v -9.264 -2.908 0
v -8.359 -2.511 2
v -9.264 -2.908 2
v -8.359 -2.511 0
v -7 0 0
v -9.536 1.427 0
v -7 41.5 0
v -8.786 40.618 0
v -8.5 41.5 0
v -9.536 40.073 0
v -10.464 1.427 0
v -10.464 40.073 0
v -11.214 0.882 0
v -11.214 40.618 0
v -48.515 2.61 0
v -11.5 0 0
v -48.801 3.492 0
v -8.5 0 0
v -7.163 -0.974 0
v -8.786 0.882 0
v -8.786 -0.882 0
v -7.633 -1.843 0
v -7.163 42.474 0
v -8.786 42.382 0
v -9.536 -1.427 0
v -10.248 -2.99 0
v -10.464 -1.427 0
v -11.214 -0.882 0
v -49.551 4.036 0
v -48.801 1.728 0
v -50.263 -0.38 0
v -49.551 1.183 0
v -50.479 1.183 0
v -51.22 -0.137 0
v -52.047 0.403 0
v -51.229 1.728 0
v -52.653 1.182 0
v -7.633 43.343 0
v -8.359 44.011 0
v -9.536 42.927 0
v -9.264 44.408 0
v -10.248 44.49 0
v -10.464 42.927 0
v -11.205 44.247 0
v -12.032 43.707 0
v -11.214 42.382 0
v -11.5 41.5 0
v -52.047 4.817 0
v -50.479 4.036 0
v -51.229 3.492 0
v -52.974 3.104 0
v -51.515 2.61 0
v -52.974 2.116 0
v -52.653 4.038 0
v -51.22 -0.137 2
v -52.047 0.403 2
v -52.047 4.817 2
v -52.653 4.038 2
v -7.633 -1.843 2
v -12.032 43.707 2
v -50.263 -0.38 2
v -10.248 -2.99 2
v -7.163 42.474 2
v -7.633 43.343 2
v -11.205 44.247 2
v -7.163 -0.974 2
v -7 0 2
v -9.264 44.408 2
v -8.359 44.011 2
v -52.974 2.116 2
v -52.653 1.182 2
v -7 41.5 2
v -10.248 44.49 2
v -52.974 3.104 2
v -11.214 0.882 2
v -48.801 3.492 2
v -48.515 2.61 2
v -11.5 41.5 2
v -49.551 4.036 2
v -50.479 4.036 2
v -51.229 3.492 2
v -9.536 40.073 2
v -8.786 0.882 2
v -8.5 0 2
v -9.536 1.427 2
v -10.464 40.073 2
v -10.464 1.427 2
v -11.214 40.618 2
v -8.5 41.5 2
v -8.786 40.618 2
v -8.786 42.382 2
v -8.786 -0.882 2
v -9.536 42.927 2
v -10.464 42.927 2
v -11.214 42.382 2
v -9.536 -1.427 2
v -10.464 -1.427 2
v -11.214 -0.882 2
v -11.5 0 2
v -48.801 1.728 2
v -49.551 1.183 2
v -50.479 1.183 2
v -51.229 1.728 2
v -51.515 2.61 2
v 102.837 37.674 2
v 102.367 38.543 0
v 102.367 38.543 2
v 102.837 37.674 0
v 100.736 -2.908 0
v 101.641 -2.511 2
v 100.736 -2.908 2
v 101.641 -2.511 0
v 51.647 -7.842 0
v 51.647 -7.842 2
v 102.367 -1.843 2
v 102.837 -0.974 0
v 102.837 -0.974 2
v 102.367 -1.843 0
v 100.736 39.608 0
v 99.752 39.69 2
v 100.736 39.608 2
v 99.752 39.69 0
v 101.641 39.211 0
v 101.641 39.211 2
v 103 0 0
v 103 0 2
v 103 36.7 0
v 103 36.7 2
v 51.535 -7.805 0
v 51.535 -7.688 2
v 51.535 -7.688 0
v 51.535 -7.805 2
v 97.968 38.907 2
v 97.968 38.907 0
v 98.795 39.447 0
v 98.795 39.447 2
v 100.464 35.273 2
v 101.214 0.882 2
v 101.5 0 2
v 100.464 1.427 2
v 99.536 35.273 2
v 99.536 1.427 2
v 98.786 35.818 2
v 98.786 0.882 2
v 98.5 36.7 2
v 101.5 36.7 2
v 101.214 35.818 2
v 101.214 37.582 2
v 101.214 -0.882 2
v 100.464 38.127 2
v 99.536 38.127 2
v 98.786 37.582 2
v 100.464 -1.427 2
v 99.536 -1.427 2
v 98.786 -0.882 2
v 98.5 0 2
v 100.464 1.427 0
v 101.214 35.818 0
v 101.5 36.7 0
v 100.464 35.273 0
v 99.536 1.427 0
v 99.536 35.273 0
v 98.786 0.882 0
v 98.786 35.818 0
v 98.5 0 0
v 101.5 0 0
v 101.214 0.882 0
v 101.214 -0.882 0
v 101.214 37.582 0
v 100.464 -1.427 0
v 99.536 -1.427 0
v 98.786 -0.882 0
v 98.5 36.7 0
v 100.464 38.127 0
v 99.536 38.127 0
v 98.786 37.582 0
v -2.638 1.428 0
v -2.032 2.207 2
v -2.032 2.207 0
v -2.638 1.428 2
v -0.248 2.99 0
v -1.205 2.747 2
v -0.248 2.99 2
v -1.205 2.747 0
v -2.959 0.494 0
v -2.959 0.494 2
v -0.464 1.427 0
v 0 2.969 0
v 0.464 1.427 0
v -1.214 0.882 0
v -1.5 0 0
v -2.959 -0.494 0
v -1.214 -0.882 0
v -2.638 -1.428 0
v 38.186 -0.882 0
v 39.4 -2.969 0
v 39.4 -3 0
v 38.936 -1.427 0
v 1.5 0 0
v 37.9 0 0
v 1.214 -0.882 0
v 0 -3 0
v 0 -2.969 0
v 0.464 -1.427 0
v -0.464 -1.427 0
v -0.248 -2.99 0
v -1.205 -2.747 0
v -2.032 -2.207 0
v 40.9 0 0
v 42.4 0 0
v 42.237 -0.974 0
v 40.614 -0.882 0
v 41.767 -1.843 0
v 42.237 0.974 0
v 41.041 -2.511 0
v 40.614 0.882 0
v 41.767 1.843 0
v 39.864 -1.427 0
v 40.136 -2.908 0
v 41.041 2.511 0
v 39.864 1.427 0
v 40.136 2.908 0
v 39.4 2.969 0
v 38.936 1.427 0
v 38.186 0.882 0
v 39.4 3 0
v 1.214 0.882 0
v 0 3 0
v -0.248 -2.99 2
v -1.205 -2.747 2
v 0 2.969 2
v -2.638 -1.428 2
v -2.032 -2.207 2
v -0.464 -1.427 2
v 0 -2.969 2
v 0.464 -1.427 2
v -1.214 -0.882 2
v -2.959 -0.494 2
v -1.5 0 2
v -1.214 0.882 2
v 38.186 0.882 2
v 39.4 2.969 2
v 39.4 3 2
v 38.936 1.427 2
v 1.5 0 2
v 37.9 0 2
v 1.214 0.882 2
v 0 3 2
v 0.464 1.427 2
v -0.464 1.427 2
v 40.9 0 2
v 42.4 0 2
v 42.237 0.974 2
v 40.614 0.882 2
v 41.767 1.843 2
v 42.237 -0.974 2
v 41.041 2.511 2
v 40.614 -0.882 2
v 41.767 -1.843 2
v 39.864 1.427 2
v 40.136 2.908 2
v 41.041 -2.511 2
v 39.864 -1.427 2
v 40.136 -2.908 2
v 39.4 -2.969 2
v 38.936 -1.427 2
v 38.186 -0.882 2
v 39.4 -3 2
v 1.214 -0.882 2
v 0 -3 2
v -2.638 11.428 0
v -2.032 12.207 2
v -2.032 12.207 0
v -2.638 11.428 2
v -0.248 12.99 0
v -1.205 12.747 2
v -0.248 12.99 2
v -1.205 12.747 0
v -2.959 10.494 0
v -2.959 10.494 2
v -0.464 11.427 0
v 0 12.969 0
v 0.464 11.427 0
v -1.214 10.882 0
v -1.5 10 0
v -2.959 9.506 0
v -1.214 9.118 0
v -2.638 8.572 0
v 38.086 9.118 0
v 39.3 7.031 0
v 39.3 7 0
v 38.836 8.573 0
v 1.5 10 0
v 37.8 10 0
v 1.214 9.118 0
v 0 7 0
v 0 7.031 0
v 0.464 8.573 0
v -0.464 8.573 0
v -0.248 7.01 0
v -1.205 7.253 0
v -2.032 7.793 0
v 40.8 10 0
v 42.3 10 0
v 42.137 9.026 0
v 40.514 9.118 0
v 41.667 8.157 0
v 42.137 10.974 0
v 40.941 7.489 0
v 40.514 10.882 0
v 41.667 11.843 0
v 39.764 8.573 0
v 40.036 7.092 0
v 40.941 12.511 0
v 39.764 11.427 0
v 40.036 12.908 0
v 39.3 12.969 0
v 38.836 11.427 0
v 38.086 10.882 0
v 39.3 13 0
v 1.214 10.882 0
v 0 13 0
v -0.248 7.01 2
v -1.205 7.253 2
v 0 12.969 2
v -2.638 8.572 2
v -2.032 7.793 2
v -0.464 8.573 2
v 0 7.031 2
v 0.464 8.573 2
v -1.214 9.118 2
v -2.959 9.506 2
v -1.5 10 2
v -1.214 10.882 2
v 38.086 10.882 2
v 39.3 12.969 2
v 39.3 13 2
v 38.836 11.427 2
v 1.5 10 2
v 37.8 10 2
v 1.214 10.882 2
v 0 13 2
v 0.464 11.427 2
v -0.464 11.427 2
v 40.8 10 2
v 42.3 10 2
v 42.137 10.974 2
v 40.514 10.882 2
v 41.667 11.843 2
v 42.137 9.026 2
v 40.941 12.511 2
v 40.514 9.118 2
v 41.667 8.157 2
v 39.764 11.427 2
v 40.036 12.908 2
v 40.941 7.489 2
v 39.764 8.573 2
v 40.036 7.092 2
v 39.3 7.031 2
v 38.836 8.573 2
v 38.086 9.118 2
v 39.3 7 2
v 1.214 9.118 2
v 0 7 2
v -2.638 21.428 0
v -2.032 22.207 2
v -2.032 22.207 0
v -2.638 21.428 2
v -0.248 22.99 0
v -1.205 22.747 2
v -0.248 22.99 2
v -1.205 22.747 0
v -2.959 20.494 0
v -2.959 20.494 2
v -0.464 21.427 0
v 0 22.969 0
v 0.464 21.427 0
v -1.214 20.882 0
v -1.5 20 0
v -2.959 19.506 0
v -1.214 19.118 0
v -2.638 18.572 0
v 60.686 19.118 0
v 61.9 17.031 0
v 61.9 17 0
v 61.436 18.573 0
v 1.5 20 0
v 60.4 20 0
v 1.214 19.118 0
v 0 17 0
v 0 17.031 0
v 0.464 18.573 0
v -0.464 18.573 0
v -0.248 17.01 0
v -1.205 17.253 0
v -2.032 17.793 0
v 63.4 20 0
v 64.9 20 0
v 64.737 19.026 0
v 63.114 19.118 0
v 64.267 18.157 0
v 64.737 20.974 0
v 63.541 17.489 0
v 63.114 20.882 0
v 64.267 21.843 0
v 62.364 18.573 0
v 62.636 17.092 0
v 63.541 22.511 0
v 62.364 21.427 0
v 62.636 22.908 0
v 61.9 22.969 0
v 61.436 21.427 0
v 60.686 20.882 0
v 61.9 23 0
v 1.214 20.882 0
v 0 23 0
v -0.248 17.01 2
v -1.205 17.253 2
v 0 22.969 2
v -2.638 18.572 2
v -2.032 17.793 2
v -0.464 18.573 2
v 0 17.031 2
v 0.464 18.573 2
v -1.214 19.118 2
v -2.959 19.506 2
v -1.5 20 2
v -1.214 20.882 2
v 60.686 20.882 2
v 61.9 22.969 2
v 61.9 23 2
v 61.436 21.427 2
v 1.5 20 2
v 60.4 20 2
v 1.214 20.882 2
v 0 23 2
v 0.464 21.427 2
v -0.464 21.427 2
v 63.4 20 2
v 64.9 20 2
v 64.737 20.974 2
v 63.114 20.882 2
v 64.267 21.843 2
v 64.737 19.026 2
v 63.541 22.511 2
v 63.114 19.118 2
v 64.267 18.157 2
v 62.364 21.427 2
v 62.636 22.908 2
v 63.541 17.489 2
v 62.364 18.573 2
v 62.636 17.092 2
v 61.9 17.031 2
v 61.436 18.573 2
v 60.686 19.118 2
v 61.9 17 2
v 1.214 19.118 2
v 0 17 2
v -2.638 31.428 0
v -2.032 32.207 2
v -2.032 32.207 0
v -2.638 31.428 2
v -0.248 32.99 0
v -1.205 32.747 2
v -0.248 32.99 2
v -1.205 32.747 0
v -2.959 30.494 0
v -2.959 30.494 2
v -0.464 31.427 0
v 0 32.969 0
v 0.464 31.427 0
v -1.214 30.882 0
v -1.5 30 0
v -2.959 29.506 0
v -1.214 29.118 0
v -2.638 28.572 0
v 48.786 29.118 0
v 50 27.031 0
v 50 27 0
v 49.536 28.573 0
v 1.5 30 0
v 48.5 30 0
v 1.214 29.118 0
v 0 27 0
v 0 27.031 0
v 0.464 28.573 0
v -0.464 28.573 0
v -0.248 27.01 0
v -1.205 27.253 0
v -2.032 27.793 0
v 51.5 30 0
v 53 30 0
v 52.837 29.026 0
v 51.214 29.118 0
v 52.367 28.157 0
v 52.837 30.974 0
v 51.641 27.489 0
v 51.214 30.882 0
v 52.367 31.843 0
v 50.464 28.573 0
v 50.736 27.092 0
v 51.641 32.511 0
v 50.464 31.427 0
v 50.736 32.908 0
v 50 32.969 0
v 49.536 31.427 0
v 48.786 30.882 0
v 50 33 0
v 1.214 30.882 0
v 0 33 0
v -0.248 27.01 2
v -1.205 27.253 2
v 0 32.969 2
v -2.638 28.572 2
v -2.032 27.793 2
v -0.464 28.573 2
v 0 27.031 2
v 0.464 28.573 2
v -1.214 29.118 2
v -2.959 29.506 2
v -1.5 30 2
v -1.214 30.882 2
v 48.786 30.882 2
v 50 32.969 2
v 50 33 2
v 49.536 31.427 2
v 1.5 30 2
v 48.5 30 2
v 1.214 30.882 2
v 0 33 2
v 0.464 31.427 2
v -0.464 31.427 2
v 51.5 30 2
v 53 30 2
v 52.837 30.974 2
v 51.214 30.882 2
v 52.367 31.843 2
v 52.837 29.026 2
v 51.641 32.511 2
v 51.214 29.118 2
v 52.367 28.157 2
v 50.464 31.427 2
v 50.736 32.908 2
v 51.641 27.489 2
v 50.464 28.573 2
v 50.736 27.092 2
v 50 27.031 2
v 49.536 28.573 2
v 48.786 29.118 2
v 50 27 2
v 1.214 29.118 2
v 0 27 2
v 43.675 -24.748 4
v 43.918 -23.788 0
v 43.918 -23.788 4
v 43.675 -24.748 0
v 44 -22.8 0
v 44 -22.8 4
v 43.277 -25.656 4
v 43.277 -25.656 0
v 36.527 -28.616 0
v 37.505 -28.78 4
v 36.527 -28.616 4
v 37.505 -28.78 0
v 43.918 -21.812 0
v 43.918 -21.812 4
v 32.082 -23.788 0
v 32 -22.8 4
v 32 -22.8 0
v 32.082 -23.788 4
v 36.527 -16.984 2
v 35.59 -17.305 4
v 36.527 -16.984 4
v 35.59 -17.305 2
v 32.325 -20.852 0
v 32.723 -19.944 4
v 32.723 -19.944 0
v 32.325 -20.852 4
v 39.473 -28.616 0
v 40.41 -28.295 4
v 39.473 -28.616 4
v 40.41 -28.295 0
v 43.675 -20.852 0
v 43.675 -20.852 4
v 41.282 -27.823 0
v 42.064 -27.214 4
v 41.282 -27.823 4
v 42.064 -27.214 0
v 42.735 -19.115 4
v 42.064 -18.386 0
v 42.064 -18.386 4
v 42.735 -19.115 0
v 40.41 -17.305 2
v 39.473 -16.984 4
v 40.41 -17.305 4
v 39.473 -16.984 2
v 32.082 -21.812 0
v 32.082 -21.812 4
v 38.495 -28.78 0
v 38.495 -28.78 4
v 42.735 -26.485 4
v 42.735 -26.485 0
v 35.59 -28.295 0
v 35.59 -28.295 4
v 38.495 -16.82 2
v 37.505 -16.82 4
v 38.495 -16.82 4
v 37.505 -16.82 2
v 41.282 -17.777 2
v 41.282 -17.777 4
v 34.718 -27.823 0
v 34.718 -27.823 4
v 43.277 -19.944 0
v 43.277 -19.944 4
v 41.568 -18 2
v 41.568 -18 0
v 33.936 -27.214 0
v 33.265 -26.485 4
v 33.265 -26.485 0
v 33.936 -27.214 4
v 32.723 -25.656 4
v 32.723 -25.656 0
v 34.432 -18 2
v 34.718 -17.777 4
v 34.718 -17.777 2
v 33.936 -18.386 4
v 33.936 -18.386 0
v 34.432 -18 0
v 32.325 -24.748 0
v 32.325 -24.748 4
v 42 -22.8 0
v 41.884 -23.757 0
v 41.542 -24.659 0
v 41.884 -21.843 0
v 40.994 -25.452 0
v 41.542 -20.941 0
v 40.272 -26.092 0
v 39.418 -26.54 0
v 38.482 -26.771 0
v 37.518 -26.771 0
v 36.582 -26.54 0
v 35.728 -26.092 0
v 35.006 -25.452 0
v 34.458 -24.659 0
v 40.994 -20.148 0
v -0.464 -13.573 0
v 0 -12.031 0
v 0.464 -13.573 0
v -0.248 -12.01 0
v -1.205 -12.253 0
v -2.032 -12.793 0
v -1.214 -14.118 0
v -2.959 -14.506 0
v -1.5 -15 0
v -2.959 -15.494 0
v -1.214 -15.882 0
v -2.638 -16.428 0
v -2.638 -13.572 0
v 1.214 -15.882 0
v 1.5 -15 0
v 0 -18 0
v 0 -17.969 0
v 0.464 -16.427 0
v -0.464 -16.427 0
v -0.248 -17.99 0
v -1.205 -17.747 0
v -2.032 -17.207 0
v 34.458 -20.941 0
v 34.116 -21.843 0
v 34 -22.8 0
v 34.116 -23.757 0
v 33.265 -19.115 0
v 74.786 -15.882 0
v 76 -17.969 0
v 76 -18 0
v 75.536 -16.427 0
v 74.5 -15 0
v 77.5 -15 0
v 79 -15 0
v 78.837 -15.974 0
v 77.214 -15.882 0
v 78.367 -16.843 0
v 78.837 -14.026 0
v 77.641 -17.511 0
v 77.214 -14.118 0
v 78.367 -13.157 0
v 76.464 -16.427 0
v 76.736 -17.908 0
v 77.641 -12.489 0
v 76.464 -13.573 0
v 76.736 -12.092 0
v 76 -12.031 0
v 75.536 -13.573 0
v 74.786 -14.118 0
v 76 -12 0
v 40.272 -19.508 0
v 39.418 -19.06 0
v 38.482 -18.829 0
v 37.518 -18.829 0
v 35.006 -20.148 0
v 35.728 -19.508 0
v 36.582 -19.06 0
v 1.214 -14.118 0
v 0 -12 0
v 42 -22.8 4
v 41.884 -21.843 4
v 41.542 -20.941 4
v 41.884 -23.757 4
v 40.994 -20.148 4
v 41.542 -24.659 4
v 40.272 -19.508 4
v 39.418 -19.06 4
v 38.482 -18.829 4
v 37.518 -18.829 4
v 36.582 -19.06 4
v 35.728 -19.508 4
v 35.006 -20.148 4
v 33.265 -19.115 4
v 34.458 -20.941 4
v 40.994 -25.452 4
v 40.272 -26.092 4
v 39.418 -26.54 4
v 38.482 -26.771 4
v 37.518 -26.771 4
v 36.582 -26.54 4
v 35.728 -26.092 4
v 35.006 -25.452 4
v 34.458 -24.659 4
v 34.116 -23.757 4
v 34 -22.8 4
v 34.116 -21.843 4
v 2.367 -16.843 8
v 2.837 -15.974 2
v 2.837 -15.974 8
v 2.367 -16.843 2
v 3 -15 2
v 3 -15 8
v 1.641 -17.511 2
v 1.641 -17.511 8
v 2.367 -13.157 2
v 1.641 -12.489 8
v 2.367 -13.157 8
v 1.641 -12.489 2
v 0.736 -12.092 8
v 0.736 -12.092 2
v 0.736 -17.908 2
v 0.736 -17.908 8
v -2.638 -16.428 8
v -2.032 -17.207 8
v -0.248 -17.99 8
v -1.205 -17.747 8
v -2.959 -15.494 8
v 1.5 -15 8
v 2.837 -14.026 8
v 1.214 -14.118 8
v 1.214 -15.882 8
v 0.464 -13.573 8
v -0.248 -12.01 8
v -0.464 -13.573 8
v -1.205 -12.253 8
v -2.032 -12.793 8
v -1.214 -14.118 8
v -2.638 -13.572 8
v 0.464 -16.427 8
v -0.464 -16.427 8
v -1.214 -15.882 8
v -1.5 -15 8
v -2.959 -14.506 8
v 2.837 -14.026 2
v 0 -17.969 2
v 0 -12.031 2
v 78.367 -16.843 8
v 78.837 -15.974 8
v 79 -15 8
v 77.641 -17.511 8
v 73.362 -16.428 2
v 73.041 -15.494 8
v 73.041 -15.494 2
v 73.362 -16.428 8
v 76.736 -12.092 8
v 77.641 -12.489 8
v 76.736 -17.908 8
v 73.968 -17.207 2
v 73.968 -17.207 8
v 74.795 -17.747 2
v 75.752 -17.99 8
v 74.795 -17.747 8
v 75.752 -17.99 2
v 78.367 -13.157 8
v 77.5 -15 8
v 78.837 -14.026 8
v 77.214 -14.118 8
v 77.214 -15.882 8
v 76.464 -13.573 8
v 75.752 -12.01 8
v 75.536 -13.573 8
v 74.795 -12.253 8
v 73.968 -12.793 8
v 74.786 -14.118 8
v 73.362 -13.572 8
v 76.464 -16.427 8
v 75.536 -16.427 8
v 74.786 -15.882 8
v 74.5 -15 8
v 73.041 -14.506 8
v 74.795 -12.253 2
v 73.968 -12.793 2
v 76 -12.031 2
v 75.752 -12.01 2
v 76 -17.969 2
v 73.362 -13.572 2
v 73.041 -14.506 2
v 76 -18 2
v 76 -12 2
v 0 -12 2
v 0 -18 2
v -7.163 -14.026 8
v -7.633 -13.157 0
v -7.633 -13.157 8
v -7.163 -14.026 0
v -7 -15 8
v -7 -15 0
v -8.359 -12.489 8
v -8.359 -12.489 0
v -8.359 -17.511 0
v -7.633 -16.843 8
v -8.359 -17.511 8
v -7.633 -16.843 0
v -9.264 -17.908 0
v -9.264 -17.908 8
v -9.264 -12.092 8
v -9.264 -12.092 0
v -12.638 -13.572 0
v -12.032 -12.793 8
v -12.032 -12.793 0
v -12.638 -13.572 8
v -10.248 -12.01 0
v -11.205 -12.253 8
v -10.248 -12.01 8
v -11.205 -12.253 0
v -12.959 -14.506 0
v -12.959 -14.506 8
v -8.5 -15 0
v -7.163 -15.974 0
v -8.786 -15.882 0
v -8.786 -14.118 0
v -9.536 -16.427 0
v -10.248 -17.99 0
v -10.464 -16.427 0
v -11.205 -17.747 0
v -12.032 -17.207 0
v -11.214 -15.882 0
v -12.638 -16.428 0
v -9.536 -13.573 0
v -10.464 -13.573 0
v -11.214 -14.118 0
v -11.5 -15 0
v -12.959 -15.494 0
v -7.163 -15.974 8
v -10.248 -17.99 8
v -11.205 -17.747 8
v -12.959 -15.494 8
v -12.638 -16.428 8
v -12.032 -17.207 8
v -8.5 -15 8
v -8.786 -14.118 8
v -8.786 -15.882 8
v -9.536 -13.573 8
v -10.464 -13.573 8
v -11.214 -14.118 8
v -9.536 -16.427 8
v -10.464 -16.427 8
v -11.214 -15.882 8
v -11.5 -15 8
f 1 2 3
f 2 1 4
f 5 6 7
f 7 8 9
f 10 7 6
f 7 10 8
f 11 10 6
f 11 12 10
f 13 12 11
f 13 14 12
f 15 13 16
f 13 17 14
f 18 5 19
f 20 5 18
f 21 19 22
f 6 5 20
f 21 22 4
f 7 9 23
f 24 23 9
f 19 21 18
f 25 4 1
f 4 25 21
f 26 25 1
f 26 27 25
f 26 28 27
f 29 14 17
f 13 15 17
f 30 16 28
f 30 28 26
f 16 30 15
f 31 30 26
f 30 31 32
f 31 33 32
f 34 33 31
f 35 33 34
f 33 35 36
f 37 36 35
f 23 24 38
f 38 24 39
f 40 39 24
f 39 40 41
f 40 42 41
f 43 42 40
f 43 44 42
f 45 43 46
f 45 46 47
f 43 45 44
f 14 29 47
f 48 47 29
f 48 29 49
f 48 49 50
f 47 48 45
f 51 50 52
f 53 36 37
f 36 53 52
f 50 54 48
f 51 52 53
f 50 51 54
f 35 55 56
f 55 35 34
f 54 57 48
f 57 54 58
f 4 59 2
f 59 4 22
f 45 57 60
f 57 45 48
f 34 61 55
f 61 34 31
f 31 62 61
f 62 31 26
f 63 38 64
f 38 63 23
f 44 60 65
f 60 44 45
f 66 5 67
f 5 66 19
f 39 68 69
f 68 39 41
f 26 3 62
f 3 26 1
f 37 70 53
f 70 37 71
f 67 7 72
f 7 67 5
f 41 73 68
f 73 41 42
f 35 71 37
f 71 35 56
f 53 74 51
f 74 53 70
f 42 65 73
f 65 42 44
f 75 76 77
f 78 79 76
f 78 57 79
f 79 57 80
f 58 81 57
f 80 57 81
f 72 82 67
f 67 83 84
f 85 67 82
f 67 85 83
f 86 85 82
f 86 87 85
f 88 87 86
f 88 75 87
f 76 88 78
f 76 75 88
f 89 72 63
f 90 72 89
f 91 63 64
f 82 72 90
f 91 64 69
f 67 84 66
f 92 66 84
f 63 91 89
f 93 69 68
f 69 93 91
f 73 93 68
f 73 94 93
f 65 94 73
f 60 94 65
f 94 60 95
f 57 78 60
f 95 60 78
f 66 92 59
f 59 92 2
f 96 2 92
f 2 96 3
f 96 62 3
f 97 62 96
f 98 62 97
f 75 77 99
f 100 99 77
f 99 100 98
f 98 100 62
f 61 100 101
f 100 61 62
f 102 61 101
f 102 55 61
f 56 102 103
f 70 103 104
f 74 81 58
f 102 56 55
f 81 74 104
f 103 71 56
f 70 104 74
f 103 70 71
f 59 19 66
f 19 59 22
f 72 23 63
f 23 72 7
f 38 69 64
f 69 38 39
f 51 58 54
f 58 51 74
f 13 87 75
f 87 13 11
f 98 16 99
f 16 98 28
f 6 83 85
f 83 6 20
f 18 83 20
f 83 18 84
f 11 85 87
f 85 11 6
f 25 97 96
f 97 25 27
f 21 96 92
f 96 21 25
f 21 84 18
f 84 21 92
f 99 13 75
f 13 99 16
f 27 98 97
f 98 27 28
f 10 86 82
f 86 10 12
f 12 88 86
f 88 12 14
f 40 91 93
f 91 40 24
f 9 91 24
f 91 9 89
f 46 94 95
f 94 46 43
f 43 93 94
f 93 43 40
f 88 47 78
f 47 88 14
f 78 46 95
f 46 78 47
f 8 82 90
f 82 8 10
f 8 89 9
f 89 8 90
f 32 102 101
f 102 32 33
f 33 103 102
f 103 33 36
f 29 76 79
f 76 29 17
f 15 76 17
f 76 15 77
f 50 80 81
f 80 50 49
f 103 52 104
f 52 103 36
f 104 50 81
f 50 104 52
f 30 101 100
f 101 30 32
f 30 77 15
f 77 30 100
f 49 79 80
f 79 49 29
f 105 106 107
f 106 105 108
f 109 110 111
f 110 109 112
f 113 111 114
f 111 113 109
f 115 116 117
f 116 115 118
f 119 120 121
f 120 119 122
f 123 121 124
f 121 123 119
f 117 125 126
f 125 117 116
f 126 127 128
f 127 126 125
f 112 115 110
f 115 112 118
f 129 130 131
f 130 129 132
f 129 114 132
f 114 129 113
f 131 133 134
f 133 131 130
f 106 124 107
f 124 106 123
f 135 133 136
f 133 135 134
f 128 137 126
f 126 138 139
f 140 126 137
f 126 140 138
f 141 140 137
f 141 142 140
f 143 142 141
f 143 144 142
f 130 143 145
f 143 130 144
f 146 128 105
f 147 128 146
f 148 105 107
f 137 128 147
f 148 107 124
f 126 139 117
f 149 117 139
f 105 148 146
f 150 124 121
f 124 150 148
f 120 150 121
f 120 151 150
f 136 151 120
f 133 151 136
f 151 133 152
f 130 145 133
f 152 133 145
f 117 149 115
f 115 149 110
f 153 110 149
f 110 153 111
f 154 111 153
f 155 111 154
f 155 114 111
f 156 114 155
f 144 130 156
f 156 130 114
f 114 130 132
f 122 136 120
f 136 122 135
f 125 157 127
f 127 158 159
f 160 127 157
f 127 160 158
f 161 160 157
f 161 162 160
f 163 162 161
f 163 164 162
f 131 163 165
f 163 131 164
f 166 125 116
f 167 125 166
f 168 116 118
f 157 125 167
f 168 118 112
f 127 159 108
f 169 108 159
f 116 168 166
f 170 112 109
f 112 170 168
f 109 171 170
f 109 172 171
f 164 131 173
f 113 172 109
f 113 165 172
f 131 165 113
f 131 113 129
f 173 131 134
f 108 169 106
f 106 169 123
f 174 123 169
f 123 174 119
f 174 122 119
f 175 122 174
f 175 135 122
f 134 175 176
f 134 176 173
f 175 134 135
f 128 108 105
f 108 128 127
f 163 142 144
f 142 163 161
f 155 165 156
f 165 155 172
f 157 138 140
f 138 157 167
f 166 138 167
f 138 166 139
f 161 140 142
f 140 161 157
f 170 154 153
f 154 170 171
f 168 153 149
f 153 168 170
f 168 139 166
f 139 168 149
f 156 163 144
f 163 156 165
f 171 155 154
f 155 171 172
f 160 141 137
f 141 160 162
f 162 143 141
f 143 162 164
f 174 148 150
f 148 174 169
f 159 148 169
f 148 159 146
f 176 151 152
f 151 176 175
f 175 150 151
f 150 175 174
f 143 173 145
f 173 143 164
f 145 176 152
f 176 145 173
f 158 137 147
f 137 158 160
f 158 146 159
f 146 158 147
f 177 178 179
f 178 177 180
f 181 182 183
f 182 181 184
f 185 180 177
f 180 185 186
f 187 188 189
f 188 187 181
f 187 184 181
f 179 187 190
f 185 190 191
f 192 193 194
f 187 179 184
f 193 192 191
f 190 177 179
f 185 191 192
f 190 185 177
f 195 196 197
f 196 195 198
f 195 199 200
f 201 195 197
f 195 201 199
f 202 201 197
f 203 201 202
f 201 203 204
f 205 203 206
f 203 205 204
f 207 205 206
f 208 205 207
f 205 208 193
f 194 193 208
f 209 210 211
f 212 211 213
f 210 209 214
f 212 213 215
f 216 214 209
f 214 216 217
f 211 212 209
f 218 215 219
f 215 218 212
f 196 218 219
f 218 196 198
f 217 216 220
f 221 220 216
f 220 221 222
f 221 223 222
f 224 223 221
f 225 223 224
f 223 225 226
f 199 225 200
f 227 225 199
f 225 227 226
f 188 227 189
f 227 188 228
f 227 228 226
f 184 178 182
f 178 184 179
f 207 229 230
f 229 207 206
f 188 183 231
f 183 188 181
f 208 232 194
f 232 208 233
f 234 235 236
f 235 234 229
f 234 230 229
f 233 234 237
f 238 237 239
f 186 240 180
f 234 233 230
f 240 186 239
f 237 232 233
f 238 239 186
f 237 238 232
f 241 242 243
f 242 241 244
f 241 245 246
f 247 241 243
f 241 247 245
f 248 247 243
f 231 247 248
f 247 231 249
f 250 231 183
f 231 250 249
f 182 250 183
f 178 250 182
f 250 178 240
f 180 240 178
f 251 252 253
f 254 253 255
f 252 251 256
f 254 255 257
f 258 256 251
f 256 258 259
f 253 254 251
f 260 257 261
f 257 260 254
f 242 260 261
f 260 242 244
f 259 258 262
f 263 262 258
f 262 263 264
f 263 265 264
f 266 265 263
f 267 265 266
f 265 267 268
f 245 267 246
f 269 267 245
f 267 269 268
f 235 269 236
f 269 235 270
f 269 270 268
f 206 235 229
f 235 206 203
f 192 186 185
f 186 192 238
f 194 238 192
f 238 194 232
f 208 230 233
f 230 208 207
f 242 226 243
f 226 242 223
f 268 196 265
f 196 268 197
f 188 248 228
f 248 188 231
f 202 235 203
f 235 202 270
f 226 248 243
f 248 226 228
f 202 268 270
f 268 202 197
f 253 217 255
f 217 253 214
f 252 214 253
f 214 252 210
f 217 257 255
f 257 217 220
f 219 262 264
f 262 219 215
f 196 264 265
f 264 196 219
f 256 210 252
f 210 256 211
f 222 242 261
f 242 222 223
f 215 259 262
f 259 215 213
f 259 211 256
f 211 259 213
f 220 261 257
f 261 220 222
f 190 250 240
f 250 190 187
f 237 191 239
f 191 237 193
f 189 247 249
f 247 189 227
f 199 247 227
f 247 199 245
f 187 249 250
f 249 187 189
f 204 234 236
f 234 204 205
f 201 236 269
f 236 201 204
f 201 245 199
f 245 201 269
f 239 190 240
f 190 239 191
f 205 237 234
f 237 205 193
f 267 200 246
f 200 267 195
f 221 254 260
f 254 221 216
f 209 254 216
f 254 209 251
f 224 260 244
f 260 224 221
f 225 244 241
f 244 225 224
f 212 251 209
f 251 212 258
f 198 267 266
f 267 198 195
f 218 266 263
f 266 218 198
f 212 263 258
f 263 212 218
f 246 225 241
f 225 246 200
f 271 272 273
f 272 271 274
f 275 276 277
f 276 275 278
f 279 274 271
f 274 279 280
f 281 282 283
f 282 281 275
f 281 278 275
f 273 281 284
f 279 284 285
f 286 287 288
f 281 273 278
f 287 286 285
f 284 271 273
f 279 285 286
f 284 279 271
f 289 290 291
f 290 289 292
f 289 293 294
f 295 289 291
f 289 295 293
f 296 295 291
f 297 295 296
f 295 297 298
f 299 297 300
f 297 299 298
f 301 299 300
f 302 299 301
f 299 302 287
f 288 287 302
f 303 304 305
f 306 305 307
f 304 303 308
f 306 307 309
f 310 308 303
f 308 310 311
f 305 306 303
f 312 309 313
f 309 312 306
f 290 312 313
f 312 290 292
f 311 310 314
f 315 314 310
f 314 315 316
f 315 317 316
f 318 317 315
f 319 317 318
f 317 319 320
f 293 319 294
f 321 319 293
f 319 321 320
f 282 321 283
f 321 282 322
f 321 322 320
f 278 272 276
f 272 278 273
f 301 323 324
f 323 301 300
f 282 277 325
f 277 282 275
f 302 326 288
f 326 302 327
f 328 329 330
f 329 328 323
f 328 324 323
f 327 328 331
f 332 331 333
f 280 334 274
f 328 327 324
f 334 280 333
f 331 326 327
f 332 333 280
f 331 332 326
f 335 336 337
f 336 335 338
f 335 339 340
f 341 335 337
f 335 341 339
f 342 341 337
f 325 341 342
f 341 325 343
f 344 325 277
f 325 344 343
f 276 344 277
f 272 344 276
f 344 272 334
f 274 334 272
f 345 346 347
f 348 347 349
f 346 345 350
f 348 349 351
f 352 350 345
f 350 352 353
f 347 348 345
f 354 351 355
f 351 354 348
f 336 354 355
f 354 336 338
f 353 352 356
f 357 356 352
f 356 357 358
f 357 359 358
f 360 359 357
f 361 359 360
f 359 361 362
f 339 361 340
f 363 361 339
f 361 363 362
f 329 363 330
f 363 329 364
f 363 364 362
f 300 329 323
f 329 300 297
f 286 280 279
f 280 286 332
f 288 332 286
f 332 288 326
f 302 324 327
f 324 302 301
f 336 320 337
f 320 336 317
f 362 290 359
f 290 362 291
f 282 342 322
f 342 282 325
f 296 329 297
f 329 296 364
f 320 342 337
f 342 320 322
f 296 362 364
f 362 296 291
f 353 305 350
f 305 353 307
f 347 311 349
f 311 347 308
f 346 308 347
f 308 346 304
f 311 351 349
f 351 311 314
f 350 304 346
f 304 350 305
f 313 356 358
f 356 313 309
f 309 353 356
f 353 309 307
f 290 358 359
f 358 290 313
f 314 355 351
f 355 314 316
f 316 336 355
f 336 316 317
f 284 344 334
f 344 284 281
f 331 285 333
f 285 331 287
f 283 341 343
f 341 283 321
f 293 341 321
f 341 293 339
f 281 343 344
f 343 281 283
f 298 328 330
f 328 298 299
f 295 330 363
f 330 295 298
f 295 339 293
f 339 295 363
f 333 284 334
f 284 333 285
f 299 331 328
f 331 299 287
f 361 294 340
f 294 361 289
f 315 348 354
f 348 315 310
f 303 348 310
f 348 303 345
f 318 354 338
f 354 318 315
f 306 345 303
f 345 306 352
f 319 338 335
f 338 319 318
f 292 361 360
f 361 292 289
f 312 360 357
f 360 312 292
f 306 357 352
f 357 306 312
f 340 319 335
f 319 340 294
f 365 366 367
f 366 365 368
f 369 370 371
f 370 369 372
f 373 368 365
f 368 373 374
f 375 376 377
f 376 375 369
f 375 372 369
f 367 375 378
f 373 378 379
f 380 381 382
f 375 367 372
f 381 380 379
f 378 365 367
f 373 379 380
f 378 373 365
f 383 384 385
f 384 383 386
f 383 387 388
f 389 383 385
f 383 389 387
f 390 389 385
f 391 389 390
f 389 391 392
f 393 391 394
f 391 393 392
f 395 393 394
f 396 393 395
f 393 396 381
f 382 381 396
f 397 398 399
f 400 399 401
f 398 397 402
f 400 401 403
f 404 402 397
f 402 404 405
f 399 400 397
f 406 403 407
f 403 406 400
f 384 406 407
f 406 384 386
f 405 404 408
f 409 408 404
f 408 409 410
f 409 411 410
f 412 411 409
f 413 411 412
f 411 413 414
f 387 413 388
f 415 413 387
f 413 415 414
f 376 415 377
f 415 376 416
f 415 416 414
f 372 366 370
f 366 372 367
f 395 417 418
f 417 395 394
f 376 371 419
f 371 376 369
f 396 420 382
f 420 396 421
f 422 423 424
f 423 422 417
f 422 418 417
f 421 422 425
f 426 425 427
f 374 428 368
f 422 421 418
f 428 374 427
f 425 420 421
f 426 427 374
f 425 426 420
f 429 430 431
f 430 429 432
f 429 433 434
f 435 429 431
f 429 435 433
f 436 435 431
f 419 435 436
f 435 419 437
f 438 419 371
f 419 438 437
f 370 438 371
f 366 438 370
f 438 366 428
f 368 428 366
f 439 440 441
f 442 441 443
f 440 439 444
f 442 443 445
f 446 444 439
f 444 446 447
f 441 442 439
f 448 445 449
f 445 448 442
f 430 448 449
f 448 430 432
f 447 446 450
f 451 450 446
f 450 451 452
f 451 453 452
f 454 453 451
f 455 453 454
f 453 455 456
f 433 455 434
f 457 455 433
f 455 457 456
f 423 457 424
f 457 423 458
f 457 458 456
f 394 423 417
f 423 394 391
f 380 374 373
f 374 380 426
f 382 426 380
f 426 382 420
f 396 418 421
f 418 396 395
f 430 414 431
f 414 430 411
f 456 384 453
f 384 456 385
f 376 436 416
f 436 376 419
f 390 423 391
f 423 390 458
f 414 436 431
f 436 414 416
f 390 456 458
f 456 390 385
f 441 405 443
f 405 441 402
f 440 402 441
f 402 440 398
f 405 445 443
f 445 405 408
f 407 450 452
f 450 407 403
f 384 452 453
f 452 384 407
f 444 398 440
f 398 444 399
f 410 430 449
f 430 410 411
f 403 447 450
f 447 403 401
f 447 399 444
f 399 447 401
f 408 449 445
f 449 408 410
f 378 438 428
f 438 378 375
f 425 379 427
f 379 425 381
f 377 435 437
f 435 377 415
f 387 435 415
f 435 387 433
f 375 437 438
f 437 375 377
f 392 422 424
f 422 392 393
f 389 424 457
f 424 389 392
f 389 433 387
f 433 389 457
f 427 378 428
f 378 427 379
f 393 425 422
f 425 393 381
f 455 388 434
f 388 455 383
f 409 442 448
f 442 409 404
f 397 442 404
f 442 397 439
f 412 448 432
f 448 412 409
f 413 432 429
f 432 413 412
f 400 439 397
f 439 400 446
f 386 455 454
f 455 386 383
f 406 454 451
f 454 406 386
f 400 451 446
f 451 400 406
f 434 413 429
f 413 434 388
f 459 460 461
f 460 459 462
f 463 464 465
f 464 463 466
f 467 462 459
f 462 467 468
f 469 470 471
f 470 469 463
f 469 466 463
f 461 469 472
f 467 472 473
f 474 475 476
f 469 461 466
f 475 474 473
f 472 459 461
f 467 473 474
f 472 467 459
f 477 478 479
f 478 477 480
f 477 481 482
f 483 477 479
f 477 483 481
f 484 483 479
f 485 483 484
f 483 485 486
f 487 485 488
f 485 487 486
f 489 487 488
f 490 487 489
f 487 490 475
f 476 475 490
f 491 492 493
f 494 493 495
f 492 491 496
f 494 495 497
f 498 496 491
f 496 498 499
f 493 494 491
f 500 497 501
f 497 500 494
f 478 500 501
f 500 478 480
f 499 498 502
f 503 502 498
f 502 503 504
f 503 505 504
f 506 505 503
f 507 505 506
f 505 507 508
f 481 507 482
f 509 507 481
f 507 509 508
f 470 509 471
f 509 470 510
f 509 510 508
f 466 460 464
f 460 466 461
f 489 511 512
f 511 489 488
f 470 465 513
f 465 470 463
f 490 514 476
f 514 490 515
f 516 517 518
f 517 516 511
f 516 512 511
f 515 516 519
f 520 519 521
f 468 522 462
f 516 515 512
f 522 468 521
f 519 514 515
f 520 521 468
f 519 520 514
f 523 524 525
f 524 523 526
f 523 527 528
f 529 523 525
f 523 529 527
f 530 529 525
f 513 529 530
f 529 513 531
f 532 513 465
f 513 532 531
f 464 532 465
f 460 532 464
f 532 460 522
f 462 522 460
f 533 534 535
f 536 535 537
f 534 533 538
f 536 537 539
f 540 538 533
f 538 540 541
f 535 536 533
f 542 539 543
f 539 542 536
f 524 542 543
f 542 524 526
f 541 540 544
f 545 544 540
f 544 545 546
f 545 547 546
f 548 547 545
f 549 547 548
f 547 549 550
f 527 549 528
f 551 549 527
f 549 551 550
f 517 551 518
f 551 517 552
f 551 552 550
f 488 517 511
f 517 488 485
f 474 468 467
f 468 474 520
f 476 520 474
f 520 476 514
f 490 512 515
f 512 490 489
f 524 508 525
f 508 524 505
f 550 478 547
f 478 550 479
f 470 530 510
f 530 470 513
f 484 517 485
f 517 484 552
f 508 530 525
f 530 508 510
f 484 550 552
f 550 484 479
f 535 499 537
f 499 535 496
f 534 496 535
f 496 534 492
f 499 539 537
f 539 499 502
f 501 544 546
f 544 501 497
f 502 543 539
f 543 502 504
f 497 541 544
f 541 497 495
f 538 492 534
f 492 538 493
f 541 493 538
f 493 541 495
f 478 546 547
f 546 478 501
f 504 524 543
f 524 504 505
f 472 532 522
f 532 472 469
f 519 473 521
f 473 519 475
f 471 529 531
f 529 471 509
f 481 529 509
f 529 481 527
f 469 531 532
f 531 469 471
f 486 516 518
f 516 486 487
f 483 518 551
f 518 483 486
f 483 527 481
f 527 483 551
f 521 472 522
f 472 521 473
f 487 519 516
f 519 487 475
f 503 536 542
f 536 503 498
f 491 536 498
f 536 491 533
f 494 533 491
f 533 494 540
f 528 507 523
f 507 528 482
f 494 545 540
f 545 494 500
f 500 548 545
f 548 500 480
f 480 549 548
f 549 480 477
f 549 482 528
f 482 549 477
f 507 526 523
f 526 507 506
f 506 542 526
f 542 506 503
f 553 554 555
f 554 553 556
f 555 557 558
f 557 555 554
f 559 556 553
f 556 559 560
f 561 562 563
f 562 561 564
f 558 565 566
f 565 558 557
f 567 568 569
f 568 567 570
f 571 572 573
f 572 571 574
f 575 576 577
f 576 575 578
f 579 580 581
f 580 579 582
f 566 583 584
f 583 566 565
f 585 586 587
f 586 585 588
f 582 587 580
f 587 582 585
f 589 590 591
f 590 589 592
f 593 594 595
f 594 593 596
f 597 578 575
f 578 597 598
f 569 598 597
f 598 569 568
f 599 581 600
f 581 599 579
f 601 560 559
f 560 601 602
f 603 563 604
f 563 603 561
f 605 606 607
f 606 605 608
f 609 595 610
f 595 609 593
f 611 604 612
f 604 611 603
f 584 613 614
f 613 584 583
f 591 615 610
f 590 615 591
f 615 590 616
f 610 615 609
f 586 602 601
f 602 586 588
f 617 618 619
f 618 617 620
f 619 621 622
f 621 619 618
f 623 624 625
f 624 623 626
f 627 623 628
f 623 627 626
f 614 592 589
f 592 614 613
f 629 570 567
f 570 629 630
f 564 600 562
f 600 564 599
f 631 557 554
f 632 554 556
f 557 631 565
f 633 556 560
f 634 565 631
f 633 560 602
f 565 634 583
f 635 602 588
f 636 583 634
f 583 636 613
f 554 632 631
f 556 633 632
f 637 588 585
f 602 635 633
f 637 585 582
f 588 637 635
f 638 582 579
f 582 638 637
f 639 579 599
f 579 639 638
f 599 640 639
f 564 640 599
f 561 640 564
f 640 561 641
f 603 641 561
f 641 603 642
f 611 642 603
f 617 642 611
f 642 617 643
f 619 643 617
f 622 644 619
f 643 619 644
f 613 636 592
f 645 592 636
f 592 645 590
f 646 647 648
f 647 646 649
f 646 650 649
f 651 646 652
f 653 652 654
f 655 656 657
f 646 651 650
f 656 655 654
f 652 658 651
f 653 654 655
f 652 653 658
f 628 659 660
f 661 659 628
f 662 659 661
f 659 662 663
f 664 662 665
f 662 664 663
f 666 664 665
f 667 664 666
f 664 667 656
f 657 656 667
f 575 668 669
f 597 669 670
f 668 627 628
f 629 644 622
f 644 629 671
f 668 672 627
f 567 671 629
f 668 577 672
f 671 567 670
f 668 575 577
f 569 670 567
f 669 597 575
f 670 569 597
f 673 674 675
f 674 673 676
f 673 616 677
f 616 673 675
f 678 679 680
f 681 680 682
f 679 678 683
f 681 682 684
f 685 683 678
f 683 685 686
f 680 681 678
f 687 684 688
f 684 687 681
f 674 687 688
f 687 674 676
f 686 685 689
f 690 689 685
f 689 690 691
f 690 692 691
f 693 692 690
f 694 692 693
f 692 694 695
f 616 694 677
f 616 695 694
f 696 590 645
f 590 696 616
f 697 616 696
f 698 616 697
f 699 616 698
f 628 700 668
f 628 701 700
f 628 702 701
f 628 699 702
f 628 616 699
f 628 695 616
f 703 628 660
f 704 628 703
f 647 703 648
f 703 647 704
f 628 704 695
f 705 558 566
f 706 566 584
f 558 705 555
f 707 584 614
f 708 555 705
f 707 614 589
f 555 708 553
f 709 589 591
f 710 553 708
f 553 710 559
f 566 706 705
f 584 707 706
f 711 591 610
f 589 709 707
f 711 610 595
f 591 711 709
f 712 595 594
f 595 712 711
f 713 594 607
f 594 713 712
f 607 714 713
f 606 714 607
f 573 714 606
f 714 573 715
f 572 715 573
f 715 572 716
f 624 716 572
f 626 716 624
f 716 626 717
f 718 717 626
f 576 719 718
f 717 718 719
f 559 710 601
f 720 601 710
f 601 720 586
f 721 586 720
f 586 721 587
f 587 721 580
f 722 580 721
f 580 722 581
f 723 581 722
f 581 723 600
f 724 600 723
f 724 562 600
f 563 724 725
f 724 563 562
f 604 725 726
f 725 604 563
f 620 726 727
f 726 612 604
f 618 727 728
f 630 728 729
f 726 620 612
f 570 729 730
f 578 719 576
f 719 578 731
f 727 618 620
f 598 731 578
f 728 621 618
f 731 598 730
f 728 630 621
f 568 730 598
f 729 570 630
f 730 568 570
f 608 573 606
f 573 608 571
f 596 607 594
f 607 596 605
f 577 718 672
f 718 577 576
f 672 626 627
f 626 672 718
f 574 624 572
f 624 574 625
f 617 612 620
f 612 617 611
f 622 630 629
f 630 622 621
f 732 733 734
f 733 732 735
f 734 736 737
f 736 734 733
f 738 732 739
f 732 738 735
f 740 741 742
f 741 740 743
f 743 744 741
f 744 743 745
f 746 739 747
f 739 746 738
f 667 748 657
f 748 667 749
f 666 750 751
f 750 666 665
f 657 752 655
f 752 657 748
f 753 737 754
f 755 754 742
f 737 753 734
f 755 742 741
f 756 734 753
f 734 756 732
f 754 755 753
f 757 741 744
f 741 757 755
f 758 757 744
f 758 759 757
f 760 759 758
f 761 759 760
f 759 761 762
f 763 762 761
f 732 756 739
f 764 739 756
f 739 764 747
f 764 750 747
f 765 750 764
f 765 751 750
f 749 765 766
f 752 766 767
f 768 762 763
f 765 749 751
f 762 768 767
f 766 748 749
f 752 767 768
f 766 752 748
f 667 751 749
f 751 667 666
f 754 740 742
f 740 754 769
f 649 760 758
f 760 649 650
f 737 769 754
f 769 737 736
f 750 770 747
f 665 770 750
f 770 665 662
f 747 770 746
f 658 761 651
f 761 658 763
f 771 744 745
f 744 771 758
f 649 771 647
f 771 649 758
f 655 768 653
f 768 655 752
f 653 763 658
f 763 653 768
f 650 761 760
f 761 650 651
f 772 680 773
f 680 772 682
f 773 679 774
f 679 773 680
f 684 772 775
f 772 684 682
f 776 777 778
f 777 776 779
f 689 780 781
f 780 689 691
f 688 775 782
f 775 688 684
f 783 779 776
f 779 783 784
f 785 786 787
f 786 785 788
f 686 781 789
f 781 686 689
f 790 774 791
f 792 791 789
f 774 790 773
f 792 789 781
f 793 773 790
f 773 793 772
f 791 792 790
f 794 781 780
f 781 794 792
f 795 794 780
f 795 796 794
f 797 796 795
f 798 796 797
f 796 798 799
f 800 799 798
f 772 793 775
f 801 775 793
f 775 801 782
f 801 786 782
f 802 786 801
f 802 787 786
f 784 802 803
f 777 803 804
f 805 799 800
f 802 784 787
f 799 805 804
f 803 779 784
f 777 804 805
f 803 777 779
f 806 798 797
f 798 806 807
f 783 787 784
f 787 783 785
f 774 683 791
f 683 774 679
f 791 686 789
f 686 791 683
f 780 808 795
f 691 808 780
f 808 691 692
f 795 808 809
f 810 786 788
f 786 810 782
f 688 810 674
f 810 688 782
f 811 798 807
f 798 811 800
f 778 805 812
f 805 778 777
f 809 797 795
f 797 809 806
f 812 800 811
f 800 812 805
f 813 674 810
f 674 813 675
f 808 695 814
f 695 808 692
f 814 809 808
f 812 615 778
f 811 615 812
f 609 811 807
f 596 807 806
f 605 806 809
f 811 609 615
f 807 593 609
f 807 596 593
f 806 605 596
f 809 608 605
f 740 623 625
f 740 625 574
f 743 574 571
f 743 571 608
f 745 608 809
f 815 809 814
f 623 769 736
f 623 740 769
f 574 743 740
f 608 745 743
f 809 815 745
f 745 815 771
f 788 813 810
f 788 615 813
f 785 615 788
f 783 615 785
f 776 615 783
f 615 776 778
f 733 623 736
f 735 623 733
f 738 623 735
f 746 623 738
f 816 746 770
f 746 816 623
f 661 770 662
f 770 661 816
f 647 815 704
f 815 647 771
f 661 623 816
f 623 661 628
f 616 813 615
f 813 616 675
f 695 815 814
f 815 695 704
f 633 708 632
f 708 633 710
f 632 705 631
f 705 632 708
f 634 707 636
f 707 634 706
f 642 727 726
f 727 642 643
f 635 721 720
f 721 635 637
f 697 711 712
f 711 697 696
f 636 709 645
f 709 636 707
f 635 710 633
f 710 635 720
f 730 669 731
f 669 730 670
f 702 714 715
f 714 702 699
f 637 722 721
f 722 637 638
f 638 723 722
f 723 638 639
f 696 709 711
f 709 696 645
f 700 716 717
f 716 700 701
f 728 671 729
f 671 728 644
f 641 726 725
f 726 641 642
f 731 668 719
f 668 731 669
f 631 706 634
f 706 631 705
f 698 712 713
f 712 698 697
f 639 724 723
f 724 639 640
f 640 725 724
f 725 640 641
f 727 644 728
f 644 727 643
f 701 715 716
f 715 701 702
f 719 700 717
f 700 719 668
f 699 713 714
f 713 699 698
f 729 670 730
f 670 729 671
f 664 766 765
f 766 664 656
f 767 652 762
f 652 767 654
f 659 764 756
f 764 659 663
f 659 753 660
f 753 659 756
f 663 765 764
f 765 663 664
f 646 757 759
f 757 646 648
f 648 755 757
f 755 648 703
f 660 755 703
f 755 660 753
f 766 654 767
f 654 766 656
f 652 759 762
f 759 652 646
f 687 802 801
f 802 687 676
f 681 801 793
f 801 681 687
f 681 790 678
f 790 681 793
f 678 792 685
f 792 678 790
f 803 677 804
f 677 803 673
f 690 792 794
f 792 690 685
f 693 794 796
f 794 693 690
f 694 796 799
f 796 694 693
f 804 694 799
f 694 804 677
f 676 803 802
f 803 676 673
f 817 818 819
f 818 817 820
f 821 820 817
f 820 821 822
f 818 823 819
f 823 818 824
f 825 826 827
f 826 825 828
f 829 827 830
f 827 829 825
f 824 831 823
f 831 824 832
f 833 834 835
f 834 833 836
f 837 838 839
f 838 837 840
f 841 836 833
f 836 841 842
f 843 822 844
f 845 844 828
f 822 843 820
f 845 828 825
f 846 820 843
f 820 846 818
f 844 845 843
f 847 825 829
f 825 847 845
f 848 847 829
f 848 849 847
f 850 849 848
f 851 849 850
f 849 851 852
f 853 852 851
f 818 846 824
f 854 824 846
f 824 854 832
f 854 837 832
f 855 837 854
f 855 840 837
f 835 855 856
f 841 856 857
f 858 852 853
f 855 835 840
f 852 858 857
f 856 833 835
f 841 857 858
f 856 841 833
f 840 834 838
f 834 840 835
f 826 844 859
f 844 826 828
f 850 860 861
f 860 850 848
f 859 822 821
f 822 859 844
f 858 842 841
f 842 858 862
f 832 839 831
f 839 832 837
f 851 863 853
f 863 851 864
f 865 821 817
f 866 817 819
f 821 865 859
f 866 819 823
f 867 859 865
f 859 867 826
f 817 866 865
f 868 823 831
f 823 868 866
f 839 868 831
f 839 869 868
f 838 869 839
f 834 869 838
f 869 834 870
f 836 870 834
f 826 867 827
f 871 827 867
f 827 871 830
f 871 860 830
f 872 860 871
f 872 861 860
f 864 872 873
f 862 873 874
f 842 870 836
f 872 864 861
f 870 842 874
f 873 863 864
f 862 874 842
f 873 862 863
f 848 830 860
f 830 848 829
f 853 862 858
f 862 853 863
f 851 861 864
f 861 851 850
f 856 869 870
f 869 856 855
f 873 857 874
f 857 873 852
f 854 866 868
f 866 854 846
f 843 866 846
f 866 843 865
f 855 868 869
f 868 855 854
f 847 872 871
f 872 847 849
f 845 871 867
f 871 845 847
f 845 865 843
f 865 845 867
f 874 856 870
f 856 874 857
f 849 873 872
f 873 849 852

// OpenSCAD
/*
 * A desendent of Theo Jansen's Strandbeests
 *
 * Copyright 2013 Barnaby Shearer <b@Zi.iS>
 * License CC BY 3.0
 */
$fa = 1;
$fs = 1;
preview = 0;

beast();

module beast(
	scale = .1
) {
	a = 380*scale;
	l=78*scale;

	if(preview==1) {
	
		for(x=[0:3]) {
			translate([
				0,
				0,
				x*28
			]) {
				leg(phase=x%2 * 180) {
					rotate([
						0,
						180,
						0
					]) {
						leg(phase=x%2 * 180, dir=-1);
					}
				}
				if(x<3) {
					translate([
						a,
						l,
						4
					]) {
						rotate([
							0,
							0,
							$t*360 + x%2 * 180
						]) {
							cam();
						}
					}
					rib();
					spine();
					translate([
						a*2,
						0,
						0,
					]) {
						spine();
					}
				}
				if(x>0) {
					rotate([
						180,
						0,
						180,
					]) {
						translate([
							-2*a,
							0,
							0,
						]) {
							rib();
						}
					}
				}
			}
		}
	} else {
		leg();
		rotate([
			180,
			0,
			0
		]) {
			translate([
				0,
				15,
				-8
			]) {
				rib();
			}
		}
		translate([
			-10,
			-15,
			-8
		]) {
			spine();
		}
		translate([
			55,
			40,
			3
		]) {
			rotate([
				0,
				90,
				0
			]) {
				//cam();
			}
		}
	}
}

function tri2ang(a, b, c)  = acos((pow(a, 2) + pow(b, 2)-pow(c, 2))/(2 * a * b));
function h(a, b) = pow(pow(a, 2) + pow(b, 2), 0.5);

module e() {
	if(preview==1) {
		translate([
			0,
			0,
			-.1
		]) {
			scale([
				1,
				1,
				1.1
			]) {
				child();
			}
		}
	} else {
		child();
	}
}

module spine(
	r1 = 3/2,
	r2 = 6/2,
	gap = 28,
	t=2
) {
	difference() {
		translate([
			0,
			0,
			t *4
		]) {
			cylinder(
				r = r2,
				h = gap-t*10
			);
		}
		translate([
			0,
			0,
			t *4
		]) {
			e() cylinder(
				r = r1,
				h = gap-t*10
			);
		}
	}
}

module rib(
	scale = .1,
	r1 = 3/2,
	r2 = 6/2,
	gap = 28,
	t = 2,
) {
	a = 380*scale;
	l=78*scale;
	difference() {
		union() {
			translate([
				a,
				l,
				t *2
			]) {
				cylinder(
					r = r2+1+t,
					h = t*2
				);
			}
			*translate([
				a- r2-t,
				l- r2-t- r2-t,
				t *3
			]) {
				cube([
					 r2+t+r2+t,
					 r2+t+ r2+t,
					t
				]);
			}
			cylinder(
				r = r2,
				h = t*4
			);
			translate([
				a*2,
				0,
				0
			]) {
				cylinder(
					r = r2,
					h =t*4
				);
			}
		
			translate([
				0,
				-r2,
				t *3
			]) {
				cube([
					a*2,
					r2*2,
					t,
				]);
			}
		}
		translate([
			a,
			l,
			t*2
		]) {
			e() cylinder(
				r = r2+1,
				h = t*2
			);

		}
		e() cylinder(
			r = r1,
			h = (gap-t)/2
		);
		translate([
			a*2,
			0,
			0
		]) {
			e() cylinder(
				r = r1,
				h = (gap-t)/2
			);
		}
	}
}

module cam(
	scale = .1,
	r1 = 3/2,
	r2 = 6/2,
	gap = 20,
	t = 2,
	phase=180,
) {
	m=150*scale;
	difference() {
		union() {
			intersection() {
				rotate([
					0,
					90,
					0
				]) {
					intersection() {
						translate([
							-3,
							-gap/2,
							-r2
						]) {
							cylinder(
								r=gap,
								h=r2*2
							);
						}
						translate([
							-gap+3,
							gap/2,
							-r2
						]) {
							cylinder(
								r=gap,
								h=r2*2
							);
						}
					}
				}
				cylinder(
					r = r2+1,
					h = gap
				);
			}
			hull() {
				translate([
					-r2,
					1,
					0
				]) {
					cube([
						r2*2,
						1,
						t
					]);
				}
				translate([
					0,
					m,
					0
				]) {
					cylinder(
						r = r2,
						h = t
					);
				}			
			}
		}
		translate([
			0,
			m,
			0
		]) {
			e() cylinder(
				r = r1,
				h = t
			);
		}	
	}
	translate([
		0,
		0,
		gap-t
	]) {
		rotate([
			0,
			0,
			phase
		]) {
			difference() {
				hull() {
					translate([
						-r2,
						1,
						0
					]) {
						cube([
							r2*2,
							1,
							t
						]);
					}
					translate([
						0,
						m,
						0
					]) {
						cylinder(
							r = r2,
							h = t
						);
					}			
				}
				translate([
					0,
					m,
					0
				]) {
					e() cylinder(
						r = r1,
						h = t
					);
				}	
			}
		}
	}
}

module tri(a, b, c, r1, r2, t, holes=3) {
	y = tri2ang(a, b, c);
	difference() {
		hull() {
			cylinder(
				r = r2,
				h = t
			);
			translate([
				0,
				a,
				0
			]) {
				cylinder(
					r = r2,
					h = t
				);
			}
			translate([
				sin(y)*b,
				cos(y)*b,
				0
			]) {
				cylinder(
					r = (holes>2) ? r2 : .1,
					h = t
				);
			}
		}
		e() cylinder(
			r = r1,
			h = t
		);
		translate([
			0,
			a,
			0
		]) {
			e() cylinder(
				r = r1,
				h = t
			);
		}
		if(holes>2) {
			translate([
				sin(y)*b,
				cos(y)*b,
				0
			]) {
				e() cylinder(
					r = r1,
					h = t
				);
			}
		}
	}
}

module strut(length, r1, r2, t) {
	difference() {
		union() {
			cylinder(
				r = r2,
				h = t
			);
			translate([
				0,
				-r2,
				0
			]) {
				cube([
					length,
					r2*2,
					t
				]);
			}
			translate([
				length,
				0,
				0
			]) {
				cylinder(
					r = r2,
					h = t
				);
			}
		}
		e() cylinder(
			r = r1,
			h = t
		);
		translate([
			length,
			0,
			0
		]) {
			e() cylinder(
				r = r1,
				h = t
			);
		}
	}
}

module leg(
	scale = .1,	
	r1 = 3/2,
	r2 = 6/2,
	t = 2,
	phase= 0,
	dir = 1
) {
	a = 380*scale;
	b = 415*scale;
	c = 393*scale;
	d = 401*scale;
	e = 558*scale;
	f = 394*scale;
	g = 367*scale;
	h = 657*scale;
	i = 490*scale;
	j = 500*scale;
	k = 619*scale;
	l=78*scale;
	m=150*scale;

	p1 = [
		a - sin(($t*360+phase)*dir)*m,
		l + cos(($t*360+phase)*dir)*m,
		0
	];
	cgk_x = cos(atan(p1[1]/p1[0]) - tri2ang(h(p1[0],p1[1]), c, k)) * c;
	cgk_y =sin(atan(p1[1]/p1[0]) - tri2ang(h(p1[0],p1[1]), c, k)) * c;
	def_x = cos(atan(p1[1]/p1[0]) + tri2ang(h(p1[0],p1[1]), b, j) + tri2ang(b, d, e)) * d;
	def_y = sin(atan(p1[1]/p1[0]) + tri2ang(h(p1[0],p1[1]), b, j)+ tri2ang(b, d, e)) * d;
	
	if(preview==1) {
		
		rotate([
			0,
			0,
			-90 + atan(p1[1]/p1[0]) + tri2ang(h(p1[0],p1[1]), b, j)
		]) {
			tri(b, -d, e, r1, r2, t);
		}
		
		translate([
			def_x,
			def_y,
			-t
		]) {
			rotate([
				0,
				0,
				atan((cgk_y-def_y)/(cgk_x-def_x)) - 
				tri2ang(h(cgk_y-def_y,cgk_x-def_x), f,g)
			]) {
				strut(f, r1, r2, t);
			}
		}
		
		rotate([
			0,
			0,
			atan(p1[1]/p1[0]) - tri2ang(h(p1[0],p1[1]), c, k)
		]) {
			translate([
				0,
				0,
				-t
			]) {
				strut(c, r1, r2, t);
			}
			translate([
				c,
				0,
				0
			]) {
				rotate([
					0,
					0,
					180 - tri2ang(c, k, h(p1[0],p1[1]))
				]) {
					translate([
						0,
						0,
						t
					]) {
						strut(k, r1, r2, t);
					}
				}
				rotate([
					0,
					0,
					90 - 
					(atan(p1[1]/p1[0]) - tri2ang(h(p1[0],p1[1]), c, k)) +
					atan((cgk_y-def_y)/(cgk_x-def_x)) +
					tri2ang(h(cgk_y-def_y,cgk_x-def_x), g, f)
				]) {
					tri(g,-i,h, r1, r2, t, 2);
				}
			}
		}
		translate(p1) {
			rotate([
				0,
				0,
				180 + atan(p1[1]/p1[0]) - tri2ang(h(p1[0],p1[1]), j, b)
			]) {
				strut(j, r1, r2, t);
			}
		}
	} else{
		translate([-10,0,0]) tri(b, -d, e, r1, r2, t);
		translate([100,0,0]) tri(g,-i,h, r1, r2, t,2);
		translate([0,0,0])	strut(f, r1, r2, t);
		translate([0,10,0])	strut(c, r1, r2, t);
		translate([0,20,0])	strut(k, r1, r2, t);
		translate([0,30,0])	strut(j, r1, r2, t);
	}
	translate([
		a*2,
		0,
		0
	]) {
		child(0);
	}
}
